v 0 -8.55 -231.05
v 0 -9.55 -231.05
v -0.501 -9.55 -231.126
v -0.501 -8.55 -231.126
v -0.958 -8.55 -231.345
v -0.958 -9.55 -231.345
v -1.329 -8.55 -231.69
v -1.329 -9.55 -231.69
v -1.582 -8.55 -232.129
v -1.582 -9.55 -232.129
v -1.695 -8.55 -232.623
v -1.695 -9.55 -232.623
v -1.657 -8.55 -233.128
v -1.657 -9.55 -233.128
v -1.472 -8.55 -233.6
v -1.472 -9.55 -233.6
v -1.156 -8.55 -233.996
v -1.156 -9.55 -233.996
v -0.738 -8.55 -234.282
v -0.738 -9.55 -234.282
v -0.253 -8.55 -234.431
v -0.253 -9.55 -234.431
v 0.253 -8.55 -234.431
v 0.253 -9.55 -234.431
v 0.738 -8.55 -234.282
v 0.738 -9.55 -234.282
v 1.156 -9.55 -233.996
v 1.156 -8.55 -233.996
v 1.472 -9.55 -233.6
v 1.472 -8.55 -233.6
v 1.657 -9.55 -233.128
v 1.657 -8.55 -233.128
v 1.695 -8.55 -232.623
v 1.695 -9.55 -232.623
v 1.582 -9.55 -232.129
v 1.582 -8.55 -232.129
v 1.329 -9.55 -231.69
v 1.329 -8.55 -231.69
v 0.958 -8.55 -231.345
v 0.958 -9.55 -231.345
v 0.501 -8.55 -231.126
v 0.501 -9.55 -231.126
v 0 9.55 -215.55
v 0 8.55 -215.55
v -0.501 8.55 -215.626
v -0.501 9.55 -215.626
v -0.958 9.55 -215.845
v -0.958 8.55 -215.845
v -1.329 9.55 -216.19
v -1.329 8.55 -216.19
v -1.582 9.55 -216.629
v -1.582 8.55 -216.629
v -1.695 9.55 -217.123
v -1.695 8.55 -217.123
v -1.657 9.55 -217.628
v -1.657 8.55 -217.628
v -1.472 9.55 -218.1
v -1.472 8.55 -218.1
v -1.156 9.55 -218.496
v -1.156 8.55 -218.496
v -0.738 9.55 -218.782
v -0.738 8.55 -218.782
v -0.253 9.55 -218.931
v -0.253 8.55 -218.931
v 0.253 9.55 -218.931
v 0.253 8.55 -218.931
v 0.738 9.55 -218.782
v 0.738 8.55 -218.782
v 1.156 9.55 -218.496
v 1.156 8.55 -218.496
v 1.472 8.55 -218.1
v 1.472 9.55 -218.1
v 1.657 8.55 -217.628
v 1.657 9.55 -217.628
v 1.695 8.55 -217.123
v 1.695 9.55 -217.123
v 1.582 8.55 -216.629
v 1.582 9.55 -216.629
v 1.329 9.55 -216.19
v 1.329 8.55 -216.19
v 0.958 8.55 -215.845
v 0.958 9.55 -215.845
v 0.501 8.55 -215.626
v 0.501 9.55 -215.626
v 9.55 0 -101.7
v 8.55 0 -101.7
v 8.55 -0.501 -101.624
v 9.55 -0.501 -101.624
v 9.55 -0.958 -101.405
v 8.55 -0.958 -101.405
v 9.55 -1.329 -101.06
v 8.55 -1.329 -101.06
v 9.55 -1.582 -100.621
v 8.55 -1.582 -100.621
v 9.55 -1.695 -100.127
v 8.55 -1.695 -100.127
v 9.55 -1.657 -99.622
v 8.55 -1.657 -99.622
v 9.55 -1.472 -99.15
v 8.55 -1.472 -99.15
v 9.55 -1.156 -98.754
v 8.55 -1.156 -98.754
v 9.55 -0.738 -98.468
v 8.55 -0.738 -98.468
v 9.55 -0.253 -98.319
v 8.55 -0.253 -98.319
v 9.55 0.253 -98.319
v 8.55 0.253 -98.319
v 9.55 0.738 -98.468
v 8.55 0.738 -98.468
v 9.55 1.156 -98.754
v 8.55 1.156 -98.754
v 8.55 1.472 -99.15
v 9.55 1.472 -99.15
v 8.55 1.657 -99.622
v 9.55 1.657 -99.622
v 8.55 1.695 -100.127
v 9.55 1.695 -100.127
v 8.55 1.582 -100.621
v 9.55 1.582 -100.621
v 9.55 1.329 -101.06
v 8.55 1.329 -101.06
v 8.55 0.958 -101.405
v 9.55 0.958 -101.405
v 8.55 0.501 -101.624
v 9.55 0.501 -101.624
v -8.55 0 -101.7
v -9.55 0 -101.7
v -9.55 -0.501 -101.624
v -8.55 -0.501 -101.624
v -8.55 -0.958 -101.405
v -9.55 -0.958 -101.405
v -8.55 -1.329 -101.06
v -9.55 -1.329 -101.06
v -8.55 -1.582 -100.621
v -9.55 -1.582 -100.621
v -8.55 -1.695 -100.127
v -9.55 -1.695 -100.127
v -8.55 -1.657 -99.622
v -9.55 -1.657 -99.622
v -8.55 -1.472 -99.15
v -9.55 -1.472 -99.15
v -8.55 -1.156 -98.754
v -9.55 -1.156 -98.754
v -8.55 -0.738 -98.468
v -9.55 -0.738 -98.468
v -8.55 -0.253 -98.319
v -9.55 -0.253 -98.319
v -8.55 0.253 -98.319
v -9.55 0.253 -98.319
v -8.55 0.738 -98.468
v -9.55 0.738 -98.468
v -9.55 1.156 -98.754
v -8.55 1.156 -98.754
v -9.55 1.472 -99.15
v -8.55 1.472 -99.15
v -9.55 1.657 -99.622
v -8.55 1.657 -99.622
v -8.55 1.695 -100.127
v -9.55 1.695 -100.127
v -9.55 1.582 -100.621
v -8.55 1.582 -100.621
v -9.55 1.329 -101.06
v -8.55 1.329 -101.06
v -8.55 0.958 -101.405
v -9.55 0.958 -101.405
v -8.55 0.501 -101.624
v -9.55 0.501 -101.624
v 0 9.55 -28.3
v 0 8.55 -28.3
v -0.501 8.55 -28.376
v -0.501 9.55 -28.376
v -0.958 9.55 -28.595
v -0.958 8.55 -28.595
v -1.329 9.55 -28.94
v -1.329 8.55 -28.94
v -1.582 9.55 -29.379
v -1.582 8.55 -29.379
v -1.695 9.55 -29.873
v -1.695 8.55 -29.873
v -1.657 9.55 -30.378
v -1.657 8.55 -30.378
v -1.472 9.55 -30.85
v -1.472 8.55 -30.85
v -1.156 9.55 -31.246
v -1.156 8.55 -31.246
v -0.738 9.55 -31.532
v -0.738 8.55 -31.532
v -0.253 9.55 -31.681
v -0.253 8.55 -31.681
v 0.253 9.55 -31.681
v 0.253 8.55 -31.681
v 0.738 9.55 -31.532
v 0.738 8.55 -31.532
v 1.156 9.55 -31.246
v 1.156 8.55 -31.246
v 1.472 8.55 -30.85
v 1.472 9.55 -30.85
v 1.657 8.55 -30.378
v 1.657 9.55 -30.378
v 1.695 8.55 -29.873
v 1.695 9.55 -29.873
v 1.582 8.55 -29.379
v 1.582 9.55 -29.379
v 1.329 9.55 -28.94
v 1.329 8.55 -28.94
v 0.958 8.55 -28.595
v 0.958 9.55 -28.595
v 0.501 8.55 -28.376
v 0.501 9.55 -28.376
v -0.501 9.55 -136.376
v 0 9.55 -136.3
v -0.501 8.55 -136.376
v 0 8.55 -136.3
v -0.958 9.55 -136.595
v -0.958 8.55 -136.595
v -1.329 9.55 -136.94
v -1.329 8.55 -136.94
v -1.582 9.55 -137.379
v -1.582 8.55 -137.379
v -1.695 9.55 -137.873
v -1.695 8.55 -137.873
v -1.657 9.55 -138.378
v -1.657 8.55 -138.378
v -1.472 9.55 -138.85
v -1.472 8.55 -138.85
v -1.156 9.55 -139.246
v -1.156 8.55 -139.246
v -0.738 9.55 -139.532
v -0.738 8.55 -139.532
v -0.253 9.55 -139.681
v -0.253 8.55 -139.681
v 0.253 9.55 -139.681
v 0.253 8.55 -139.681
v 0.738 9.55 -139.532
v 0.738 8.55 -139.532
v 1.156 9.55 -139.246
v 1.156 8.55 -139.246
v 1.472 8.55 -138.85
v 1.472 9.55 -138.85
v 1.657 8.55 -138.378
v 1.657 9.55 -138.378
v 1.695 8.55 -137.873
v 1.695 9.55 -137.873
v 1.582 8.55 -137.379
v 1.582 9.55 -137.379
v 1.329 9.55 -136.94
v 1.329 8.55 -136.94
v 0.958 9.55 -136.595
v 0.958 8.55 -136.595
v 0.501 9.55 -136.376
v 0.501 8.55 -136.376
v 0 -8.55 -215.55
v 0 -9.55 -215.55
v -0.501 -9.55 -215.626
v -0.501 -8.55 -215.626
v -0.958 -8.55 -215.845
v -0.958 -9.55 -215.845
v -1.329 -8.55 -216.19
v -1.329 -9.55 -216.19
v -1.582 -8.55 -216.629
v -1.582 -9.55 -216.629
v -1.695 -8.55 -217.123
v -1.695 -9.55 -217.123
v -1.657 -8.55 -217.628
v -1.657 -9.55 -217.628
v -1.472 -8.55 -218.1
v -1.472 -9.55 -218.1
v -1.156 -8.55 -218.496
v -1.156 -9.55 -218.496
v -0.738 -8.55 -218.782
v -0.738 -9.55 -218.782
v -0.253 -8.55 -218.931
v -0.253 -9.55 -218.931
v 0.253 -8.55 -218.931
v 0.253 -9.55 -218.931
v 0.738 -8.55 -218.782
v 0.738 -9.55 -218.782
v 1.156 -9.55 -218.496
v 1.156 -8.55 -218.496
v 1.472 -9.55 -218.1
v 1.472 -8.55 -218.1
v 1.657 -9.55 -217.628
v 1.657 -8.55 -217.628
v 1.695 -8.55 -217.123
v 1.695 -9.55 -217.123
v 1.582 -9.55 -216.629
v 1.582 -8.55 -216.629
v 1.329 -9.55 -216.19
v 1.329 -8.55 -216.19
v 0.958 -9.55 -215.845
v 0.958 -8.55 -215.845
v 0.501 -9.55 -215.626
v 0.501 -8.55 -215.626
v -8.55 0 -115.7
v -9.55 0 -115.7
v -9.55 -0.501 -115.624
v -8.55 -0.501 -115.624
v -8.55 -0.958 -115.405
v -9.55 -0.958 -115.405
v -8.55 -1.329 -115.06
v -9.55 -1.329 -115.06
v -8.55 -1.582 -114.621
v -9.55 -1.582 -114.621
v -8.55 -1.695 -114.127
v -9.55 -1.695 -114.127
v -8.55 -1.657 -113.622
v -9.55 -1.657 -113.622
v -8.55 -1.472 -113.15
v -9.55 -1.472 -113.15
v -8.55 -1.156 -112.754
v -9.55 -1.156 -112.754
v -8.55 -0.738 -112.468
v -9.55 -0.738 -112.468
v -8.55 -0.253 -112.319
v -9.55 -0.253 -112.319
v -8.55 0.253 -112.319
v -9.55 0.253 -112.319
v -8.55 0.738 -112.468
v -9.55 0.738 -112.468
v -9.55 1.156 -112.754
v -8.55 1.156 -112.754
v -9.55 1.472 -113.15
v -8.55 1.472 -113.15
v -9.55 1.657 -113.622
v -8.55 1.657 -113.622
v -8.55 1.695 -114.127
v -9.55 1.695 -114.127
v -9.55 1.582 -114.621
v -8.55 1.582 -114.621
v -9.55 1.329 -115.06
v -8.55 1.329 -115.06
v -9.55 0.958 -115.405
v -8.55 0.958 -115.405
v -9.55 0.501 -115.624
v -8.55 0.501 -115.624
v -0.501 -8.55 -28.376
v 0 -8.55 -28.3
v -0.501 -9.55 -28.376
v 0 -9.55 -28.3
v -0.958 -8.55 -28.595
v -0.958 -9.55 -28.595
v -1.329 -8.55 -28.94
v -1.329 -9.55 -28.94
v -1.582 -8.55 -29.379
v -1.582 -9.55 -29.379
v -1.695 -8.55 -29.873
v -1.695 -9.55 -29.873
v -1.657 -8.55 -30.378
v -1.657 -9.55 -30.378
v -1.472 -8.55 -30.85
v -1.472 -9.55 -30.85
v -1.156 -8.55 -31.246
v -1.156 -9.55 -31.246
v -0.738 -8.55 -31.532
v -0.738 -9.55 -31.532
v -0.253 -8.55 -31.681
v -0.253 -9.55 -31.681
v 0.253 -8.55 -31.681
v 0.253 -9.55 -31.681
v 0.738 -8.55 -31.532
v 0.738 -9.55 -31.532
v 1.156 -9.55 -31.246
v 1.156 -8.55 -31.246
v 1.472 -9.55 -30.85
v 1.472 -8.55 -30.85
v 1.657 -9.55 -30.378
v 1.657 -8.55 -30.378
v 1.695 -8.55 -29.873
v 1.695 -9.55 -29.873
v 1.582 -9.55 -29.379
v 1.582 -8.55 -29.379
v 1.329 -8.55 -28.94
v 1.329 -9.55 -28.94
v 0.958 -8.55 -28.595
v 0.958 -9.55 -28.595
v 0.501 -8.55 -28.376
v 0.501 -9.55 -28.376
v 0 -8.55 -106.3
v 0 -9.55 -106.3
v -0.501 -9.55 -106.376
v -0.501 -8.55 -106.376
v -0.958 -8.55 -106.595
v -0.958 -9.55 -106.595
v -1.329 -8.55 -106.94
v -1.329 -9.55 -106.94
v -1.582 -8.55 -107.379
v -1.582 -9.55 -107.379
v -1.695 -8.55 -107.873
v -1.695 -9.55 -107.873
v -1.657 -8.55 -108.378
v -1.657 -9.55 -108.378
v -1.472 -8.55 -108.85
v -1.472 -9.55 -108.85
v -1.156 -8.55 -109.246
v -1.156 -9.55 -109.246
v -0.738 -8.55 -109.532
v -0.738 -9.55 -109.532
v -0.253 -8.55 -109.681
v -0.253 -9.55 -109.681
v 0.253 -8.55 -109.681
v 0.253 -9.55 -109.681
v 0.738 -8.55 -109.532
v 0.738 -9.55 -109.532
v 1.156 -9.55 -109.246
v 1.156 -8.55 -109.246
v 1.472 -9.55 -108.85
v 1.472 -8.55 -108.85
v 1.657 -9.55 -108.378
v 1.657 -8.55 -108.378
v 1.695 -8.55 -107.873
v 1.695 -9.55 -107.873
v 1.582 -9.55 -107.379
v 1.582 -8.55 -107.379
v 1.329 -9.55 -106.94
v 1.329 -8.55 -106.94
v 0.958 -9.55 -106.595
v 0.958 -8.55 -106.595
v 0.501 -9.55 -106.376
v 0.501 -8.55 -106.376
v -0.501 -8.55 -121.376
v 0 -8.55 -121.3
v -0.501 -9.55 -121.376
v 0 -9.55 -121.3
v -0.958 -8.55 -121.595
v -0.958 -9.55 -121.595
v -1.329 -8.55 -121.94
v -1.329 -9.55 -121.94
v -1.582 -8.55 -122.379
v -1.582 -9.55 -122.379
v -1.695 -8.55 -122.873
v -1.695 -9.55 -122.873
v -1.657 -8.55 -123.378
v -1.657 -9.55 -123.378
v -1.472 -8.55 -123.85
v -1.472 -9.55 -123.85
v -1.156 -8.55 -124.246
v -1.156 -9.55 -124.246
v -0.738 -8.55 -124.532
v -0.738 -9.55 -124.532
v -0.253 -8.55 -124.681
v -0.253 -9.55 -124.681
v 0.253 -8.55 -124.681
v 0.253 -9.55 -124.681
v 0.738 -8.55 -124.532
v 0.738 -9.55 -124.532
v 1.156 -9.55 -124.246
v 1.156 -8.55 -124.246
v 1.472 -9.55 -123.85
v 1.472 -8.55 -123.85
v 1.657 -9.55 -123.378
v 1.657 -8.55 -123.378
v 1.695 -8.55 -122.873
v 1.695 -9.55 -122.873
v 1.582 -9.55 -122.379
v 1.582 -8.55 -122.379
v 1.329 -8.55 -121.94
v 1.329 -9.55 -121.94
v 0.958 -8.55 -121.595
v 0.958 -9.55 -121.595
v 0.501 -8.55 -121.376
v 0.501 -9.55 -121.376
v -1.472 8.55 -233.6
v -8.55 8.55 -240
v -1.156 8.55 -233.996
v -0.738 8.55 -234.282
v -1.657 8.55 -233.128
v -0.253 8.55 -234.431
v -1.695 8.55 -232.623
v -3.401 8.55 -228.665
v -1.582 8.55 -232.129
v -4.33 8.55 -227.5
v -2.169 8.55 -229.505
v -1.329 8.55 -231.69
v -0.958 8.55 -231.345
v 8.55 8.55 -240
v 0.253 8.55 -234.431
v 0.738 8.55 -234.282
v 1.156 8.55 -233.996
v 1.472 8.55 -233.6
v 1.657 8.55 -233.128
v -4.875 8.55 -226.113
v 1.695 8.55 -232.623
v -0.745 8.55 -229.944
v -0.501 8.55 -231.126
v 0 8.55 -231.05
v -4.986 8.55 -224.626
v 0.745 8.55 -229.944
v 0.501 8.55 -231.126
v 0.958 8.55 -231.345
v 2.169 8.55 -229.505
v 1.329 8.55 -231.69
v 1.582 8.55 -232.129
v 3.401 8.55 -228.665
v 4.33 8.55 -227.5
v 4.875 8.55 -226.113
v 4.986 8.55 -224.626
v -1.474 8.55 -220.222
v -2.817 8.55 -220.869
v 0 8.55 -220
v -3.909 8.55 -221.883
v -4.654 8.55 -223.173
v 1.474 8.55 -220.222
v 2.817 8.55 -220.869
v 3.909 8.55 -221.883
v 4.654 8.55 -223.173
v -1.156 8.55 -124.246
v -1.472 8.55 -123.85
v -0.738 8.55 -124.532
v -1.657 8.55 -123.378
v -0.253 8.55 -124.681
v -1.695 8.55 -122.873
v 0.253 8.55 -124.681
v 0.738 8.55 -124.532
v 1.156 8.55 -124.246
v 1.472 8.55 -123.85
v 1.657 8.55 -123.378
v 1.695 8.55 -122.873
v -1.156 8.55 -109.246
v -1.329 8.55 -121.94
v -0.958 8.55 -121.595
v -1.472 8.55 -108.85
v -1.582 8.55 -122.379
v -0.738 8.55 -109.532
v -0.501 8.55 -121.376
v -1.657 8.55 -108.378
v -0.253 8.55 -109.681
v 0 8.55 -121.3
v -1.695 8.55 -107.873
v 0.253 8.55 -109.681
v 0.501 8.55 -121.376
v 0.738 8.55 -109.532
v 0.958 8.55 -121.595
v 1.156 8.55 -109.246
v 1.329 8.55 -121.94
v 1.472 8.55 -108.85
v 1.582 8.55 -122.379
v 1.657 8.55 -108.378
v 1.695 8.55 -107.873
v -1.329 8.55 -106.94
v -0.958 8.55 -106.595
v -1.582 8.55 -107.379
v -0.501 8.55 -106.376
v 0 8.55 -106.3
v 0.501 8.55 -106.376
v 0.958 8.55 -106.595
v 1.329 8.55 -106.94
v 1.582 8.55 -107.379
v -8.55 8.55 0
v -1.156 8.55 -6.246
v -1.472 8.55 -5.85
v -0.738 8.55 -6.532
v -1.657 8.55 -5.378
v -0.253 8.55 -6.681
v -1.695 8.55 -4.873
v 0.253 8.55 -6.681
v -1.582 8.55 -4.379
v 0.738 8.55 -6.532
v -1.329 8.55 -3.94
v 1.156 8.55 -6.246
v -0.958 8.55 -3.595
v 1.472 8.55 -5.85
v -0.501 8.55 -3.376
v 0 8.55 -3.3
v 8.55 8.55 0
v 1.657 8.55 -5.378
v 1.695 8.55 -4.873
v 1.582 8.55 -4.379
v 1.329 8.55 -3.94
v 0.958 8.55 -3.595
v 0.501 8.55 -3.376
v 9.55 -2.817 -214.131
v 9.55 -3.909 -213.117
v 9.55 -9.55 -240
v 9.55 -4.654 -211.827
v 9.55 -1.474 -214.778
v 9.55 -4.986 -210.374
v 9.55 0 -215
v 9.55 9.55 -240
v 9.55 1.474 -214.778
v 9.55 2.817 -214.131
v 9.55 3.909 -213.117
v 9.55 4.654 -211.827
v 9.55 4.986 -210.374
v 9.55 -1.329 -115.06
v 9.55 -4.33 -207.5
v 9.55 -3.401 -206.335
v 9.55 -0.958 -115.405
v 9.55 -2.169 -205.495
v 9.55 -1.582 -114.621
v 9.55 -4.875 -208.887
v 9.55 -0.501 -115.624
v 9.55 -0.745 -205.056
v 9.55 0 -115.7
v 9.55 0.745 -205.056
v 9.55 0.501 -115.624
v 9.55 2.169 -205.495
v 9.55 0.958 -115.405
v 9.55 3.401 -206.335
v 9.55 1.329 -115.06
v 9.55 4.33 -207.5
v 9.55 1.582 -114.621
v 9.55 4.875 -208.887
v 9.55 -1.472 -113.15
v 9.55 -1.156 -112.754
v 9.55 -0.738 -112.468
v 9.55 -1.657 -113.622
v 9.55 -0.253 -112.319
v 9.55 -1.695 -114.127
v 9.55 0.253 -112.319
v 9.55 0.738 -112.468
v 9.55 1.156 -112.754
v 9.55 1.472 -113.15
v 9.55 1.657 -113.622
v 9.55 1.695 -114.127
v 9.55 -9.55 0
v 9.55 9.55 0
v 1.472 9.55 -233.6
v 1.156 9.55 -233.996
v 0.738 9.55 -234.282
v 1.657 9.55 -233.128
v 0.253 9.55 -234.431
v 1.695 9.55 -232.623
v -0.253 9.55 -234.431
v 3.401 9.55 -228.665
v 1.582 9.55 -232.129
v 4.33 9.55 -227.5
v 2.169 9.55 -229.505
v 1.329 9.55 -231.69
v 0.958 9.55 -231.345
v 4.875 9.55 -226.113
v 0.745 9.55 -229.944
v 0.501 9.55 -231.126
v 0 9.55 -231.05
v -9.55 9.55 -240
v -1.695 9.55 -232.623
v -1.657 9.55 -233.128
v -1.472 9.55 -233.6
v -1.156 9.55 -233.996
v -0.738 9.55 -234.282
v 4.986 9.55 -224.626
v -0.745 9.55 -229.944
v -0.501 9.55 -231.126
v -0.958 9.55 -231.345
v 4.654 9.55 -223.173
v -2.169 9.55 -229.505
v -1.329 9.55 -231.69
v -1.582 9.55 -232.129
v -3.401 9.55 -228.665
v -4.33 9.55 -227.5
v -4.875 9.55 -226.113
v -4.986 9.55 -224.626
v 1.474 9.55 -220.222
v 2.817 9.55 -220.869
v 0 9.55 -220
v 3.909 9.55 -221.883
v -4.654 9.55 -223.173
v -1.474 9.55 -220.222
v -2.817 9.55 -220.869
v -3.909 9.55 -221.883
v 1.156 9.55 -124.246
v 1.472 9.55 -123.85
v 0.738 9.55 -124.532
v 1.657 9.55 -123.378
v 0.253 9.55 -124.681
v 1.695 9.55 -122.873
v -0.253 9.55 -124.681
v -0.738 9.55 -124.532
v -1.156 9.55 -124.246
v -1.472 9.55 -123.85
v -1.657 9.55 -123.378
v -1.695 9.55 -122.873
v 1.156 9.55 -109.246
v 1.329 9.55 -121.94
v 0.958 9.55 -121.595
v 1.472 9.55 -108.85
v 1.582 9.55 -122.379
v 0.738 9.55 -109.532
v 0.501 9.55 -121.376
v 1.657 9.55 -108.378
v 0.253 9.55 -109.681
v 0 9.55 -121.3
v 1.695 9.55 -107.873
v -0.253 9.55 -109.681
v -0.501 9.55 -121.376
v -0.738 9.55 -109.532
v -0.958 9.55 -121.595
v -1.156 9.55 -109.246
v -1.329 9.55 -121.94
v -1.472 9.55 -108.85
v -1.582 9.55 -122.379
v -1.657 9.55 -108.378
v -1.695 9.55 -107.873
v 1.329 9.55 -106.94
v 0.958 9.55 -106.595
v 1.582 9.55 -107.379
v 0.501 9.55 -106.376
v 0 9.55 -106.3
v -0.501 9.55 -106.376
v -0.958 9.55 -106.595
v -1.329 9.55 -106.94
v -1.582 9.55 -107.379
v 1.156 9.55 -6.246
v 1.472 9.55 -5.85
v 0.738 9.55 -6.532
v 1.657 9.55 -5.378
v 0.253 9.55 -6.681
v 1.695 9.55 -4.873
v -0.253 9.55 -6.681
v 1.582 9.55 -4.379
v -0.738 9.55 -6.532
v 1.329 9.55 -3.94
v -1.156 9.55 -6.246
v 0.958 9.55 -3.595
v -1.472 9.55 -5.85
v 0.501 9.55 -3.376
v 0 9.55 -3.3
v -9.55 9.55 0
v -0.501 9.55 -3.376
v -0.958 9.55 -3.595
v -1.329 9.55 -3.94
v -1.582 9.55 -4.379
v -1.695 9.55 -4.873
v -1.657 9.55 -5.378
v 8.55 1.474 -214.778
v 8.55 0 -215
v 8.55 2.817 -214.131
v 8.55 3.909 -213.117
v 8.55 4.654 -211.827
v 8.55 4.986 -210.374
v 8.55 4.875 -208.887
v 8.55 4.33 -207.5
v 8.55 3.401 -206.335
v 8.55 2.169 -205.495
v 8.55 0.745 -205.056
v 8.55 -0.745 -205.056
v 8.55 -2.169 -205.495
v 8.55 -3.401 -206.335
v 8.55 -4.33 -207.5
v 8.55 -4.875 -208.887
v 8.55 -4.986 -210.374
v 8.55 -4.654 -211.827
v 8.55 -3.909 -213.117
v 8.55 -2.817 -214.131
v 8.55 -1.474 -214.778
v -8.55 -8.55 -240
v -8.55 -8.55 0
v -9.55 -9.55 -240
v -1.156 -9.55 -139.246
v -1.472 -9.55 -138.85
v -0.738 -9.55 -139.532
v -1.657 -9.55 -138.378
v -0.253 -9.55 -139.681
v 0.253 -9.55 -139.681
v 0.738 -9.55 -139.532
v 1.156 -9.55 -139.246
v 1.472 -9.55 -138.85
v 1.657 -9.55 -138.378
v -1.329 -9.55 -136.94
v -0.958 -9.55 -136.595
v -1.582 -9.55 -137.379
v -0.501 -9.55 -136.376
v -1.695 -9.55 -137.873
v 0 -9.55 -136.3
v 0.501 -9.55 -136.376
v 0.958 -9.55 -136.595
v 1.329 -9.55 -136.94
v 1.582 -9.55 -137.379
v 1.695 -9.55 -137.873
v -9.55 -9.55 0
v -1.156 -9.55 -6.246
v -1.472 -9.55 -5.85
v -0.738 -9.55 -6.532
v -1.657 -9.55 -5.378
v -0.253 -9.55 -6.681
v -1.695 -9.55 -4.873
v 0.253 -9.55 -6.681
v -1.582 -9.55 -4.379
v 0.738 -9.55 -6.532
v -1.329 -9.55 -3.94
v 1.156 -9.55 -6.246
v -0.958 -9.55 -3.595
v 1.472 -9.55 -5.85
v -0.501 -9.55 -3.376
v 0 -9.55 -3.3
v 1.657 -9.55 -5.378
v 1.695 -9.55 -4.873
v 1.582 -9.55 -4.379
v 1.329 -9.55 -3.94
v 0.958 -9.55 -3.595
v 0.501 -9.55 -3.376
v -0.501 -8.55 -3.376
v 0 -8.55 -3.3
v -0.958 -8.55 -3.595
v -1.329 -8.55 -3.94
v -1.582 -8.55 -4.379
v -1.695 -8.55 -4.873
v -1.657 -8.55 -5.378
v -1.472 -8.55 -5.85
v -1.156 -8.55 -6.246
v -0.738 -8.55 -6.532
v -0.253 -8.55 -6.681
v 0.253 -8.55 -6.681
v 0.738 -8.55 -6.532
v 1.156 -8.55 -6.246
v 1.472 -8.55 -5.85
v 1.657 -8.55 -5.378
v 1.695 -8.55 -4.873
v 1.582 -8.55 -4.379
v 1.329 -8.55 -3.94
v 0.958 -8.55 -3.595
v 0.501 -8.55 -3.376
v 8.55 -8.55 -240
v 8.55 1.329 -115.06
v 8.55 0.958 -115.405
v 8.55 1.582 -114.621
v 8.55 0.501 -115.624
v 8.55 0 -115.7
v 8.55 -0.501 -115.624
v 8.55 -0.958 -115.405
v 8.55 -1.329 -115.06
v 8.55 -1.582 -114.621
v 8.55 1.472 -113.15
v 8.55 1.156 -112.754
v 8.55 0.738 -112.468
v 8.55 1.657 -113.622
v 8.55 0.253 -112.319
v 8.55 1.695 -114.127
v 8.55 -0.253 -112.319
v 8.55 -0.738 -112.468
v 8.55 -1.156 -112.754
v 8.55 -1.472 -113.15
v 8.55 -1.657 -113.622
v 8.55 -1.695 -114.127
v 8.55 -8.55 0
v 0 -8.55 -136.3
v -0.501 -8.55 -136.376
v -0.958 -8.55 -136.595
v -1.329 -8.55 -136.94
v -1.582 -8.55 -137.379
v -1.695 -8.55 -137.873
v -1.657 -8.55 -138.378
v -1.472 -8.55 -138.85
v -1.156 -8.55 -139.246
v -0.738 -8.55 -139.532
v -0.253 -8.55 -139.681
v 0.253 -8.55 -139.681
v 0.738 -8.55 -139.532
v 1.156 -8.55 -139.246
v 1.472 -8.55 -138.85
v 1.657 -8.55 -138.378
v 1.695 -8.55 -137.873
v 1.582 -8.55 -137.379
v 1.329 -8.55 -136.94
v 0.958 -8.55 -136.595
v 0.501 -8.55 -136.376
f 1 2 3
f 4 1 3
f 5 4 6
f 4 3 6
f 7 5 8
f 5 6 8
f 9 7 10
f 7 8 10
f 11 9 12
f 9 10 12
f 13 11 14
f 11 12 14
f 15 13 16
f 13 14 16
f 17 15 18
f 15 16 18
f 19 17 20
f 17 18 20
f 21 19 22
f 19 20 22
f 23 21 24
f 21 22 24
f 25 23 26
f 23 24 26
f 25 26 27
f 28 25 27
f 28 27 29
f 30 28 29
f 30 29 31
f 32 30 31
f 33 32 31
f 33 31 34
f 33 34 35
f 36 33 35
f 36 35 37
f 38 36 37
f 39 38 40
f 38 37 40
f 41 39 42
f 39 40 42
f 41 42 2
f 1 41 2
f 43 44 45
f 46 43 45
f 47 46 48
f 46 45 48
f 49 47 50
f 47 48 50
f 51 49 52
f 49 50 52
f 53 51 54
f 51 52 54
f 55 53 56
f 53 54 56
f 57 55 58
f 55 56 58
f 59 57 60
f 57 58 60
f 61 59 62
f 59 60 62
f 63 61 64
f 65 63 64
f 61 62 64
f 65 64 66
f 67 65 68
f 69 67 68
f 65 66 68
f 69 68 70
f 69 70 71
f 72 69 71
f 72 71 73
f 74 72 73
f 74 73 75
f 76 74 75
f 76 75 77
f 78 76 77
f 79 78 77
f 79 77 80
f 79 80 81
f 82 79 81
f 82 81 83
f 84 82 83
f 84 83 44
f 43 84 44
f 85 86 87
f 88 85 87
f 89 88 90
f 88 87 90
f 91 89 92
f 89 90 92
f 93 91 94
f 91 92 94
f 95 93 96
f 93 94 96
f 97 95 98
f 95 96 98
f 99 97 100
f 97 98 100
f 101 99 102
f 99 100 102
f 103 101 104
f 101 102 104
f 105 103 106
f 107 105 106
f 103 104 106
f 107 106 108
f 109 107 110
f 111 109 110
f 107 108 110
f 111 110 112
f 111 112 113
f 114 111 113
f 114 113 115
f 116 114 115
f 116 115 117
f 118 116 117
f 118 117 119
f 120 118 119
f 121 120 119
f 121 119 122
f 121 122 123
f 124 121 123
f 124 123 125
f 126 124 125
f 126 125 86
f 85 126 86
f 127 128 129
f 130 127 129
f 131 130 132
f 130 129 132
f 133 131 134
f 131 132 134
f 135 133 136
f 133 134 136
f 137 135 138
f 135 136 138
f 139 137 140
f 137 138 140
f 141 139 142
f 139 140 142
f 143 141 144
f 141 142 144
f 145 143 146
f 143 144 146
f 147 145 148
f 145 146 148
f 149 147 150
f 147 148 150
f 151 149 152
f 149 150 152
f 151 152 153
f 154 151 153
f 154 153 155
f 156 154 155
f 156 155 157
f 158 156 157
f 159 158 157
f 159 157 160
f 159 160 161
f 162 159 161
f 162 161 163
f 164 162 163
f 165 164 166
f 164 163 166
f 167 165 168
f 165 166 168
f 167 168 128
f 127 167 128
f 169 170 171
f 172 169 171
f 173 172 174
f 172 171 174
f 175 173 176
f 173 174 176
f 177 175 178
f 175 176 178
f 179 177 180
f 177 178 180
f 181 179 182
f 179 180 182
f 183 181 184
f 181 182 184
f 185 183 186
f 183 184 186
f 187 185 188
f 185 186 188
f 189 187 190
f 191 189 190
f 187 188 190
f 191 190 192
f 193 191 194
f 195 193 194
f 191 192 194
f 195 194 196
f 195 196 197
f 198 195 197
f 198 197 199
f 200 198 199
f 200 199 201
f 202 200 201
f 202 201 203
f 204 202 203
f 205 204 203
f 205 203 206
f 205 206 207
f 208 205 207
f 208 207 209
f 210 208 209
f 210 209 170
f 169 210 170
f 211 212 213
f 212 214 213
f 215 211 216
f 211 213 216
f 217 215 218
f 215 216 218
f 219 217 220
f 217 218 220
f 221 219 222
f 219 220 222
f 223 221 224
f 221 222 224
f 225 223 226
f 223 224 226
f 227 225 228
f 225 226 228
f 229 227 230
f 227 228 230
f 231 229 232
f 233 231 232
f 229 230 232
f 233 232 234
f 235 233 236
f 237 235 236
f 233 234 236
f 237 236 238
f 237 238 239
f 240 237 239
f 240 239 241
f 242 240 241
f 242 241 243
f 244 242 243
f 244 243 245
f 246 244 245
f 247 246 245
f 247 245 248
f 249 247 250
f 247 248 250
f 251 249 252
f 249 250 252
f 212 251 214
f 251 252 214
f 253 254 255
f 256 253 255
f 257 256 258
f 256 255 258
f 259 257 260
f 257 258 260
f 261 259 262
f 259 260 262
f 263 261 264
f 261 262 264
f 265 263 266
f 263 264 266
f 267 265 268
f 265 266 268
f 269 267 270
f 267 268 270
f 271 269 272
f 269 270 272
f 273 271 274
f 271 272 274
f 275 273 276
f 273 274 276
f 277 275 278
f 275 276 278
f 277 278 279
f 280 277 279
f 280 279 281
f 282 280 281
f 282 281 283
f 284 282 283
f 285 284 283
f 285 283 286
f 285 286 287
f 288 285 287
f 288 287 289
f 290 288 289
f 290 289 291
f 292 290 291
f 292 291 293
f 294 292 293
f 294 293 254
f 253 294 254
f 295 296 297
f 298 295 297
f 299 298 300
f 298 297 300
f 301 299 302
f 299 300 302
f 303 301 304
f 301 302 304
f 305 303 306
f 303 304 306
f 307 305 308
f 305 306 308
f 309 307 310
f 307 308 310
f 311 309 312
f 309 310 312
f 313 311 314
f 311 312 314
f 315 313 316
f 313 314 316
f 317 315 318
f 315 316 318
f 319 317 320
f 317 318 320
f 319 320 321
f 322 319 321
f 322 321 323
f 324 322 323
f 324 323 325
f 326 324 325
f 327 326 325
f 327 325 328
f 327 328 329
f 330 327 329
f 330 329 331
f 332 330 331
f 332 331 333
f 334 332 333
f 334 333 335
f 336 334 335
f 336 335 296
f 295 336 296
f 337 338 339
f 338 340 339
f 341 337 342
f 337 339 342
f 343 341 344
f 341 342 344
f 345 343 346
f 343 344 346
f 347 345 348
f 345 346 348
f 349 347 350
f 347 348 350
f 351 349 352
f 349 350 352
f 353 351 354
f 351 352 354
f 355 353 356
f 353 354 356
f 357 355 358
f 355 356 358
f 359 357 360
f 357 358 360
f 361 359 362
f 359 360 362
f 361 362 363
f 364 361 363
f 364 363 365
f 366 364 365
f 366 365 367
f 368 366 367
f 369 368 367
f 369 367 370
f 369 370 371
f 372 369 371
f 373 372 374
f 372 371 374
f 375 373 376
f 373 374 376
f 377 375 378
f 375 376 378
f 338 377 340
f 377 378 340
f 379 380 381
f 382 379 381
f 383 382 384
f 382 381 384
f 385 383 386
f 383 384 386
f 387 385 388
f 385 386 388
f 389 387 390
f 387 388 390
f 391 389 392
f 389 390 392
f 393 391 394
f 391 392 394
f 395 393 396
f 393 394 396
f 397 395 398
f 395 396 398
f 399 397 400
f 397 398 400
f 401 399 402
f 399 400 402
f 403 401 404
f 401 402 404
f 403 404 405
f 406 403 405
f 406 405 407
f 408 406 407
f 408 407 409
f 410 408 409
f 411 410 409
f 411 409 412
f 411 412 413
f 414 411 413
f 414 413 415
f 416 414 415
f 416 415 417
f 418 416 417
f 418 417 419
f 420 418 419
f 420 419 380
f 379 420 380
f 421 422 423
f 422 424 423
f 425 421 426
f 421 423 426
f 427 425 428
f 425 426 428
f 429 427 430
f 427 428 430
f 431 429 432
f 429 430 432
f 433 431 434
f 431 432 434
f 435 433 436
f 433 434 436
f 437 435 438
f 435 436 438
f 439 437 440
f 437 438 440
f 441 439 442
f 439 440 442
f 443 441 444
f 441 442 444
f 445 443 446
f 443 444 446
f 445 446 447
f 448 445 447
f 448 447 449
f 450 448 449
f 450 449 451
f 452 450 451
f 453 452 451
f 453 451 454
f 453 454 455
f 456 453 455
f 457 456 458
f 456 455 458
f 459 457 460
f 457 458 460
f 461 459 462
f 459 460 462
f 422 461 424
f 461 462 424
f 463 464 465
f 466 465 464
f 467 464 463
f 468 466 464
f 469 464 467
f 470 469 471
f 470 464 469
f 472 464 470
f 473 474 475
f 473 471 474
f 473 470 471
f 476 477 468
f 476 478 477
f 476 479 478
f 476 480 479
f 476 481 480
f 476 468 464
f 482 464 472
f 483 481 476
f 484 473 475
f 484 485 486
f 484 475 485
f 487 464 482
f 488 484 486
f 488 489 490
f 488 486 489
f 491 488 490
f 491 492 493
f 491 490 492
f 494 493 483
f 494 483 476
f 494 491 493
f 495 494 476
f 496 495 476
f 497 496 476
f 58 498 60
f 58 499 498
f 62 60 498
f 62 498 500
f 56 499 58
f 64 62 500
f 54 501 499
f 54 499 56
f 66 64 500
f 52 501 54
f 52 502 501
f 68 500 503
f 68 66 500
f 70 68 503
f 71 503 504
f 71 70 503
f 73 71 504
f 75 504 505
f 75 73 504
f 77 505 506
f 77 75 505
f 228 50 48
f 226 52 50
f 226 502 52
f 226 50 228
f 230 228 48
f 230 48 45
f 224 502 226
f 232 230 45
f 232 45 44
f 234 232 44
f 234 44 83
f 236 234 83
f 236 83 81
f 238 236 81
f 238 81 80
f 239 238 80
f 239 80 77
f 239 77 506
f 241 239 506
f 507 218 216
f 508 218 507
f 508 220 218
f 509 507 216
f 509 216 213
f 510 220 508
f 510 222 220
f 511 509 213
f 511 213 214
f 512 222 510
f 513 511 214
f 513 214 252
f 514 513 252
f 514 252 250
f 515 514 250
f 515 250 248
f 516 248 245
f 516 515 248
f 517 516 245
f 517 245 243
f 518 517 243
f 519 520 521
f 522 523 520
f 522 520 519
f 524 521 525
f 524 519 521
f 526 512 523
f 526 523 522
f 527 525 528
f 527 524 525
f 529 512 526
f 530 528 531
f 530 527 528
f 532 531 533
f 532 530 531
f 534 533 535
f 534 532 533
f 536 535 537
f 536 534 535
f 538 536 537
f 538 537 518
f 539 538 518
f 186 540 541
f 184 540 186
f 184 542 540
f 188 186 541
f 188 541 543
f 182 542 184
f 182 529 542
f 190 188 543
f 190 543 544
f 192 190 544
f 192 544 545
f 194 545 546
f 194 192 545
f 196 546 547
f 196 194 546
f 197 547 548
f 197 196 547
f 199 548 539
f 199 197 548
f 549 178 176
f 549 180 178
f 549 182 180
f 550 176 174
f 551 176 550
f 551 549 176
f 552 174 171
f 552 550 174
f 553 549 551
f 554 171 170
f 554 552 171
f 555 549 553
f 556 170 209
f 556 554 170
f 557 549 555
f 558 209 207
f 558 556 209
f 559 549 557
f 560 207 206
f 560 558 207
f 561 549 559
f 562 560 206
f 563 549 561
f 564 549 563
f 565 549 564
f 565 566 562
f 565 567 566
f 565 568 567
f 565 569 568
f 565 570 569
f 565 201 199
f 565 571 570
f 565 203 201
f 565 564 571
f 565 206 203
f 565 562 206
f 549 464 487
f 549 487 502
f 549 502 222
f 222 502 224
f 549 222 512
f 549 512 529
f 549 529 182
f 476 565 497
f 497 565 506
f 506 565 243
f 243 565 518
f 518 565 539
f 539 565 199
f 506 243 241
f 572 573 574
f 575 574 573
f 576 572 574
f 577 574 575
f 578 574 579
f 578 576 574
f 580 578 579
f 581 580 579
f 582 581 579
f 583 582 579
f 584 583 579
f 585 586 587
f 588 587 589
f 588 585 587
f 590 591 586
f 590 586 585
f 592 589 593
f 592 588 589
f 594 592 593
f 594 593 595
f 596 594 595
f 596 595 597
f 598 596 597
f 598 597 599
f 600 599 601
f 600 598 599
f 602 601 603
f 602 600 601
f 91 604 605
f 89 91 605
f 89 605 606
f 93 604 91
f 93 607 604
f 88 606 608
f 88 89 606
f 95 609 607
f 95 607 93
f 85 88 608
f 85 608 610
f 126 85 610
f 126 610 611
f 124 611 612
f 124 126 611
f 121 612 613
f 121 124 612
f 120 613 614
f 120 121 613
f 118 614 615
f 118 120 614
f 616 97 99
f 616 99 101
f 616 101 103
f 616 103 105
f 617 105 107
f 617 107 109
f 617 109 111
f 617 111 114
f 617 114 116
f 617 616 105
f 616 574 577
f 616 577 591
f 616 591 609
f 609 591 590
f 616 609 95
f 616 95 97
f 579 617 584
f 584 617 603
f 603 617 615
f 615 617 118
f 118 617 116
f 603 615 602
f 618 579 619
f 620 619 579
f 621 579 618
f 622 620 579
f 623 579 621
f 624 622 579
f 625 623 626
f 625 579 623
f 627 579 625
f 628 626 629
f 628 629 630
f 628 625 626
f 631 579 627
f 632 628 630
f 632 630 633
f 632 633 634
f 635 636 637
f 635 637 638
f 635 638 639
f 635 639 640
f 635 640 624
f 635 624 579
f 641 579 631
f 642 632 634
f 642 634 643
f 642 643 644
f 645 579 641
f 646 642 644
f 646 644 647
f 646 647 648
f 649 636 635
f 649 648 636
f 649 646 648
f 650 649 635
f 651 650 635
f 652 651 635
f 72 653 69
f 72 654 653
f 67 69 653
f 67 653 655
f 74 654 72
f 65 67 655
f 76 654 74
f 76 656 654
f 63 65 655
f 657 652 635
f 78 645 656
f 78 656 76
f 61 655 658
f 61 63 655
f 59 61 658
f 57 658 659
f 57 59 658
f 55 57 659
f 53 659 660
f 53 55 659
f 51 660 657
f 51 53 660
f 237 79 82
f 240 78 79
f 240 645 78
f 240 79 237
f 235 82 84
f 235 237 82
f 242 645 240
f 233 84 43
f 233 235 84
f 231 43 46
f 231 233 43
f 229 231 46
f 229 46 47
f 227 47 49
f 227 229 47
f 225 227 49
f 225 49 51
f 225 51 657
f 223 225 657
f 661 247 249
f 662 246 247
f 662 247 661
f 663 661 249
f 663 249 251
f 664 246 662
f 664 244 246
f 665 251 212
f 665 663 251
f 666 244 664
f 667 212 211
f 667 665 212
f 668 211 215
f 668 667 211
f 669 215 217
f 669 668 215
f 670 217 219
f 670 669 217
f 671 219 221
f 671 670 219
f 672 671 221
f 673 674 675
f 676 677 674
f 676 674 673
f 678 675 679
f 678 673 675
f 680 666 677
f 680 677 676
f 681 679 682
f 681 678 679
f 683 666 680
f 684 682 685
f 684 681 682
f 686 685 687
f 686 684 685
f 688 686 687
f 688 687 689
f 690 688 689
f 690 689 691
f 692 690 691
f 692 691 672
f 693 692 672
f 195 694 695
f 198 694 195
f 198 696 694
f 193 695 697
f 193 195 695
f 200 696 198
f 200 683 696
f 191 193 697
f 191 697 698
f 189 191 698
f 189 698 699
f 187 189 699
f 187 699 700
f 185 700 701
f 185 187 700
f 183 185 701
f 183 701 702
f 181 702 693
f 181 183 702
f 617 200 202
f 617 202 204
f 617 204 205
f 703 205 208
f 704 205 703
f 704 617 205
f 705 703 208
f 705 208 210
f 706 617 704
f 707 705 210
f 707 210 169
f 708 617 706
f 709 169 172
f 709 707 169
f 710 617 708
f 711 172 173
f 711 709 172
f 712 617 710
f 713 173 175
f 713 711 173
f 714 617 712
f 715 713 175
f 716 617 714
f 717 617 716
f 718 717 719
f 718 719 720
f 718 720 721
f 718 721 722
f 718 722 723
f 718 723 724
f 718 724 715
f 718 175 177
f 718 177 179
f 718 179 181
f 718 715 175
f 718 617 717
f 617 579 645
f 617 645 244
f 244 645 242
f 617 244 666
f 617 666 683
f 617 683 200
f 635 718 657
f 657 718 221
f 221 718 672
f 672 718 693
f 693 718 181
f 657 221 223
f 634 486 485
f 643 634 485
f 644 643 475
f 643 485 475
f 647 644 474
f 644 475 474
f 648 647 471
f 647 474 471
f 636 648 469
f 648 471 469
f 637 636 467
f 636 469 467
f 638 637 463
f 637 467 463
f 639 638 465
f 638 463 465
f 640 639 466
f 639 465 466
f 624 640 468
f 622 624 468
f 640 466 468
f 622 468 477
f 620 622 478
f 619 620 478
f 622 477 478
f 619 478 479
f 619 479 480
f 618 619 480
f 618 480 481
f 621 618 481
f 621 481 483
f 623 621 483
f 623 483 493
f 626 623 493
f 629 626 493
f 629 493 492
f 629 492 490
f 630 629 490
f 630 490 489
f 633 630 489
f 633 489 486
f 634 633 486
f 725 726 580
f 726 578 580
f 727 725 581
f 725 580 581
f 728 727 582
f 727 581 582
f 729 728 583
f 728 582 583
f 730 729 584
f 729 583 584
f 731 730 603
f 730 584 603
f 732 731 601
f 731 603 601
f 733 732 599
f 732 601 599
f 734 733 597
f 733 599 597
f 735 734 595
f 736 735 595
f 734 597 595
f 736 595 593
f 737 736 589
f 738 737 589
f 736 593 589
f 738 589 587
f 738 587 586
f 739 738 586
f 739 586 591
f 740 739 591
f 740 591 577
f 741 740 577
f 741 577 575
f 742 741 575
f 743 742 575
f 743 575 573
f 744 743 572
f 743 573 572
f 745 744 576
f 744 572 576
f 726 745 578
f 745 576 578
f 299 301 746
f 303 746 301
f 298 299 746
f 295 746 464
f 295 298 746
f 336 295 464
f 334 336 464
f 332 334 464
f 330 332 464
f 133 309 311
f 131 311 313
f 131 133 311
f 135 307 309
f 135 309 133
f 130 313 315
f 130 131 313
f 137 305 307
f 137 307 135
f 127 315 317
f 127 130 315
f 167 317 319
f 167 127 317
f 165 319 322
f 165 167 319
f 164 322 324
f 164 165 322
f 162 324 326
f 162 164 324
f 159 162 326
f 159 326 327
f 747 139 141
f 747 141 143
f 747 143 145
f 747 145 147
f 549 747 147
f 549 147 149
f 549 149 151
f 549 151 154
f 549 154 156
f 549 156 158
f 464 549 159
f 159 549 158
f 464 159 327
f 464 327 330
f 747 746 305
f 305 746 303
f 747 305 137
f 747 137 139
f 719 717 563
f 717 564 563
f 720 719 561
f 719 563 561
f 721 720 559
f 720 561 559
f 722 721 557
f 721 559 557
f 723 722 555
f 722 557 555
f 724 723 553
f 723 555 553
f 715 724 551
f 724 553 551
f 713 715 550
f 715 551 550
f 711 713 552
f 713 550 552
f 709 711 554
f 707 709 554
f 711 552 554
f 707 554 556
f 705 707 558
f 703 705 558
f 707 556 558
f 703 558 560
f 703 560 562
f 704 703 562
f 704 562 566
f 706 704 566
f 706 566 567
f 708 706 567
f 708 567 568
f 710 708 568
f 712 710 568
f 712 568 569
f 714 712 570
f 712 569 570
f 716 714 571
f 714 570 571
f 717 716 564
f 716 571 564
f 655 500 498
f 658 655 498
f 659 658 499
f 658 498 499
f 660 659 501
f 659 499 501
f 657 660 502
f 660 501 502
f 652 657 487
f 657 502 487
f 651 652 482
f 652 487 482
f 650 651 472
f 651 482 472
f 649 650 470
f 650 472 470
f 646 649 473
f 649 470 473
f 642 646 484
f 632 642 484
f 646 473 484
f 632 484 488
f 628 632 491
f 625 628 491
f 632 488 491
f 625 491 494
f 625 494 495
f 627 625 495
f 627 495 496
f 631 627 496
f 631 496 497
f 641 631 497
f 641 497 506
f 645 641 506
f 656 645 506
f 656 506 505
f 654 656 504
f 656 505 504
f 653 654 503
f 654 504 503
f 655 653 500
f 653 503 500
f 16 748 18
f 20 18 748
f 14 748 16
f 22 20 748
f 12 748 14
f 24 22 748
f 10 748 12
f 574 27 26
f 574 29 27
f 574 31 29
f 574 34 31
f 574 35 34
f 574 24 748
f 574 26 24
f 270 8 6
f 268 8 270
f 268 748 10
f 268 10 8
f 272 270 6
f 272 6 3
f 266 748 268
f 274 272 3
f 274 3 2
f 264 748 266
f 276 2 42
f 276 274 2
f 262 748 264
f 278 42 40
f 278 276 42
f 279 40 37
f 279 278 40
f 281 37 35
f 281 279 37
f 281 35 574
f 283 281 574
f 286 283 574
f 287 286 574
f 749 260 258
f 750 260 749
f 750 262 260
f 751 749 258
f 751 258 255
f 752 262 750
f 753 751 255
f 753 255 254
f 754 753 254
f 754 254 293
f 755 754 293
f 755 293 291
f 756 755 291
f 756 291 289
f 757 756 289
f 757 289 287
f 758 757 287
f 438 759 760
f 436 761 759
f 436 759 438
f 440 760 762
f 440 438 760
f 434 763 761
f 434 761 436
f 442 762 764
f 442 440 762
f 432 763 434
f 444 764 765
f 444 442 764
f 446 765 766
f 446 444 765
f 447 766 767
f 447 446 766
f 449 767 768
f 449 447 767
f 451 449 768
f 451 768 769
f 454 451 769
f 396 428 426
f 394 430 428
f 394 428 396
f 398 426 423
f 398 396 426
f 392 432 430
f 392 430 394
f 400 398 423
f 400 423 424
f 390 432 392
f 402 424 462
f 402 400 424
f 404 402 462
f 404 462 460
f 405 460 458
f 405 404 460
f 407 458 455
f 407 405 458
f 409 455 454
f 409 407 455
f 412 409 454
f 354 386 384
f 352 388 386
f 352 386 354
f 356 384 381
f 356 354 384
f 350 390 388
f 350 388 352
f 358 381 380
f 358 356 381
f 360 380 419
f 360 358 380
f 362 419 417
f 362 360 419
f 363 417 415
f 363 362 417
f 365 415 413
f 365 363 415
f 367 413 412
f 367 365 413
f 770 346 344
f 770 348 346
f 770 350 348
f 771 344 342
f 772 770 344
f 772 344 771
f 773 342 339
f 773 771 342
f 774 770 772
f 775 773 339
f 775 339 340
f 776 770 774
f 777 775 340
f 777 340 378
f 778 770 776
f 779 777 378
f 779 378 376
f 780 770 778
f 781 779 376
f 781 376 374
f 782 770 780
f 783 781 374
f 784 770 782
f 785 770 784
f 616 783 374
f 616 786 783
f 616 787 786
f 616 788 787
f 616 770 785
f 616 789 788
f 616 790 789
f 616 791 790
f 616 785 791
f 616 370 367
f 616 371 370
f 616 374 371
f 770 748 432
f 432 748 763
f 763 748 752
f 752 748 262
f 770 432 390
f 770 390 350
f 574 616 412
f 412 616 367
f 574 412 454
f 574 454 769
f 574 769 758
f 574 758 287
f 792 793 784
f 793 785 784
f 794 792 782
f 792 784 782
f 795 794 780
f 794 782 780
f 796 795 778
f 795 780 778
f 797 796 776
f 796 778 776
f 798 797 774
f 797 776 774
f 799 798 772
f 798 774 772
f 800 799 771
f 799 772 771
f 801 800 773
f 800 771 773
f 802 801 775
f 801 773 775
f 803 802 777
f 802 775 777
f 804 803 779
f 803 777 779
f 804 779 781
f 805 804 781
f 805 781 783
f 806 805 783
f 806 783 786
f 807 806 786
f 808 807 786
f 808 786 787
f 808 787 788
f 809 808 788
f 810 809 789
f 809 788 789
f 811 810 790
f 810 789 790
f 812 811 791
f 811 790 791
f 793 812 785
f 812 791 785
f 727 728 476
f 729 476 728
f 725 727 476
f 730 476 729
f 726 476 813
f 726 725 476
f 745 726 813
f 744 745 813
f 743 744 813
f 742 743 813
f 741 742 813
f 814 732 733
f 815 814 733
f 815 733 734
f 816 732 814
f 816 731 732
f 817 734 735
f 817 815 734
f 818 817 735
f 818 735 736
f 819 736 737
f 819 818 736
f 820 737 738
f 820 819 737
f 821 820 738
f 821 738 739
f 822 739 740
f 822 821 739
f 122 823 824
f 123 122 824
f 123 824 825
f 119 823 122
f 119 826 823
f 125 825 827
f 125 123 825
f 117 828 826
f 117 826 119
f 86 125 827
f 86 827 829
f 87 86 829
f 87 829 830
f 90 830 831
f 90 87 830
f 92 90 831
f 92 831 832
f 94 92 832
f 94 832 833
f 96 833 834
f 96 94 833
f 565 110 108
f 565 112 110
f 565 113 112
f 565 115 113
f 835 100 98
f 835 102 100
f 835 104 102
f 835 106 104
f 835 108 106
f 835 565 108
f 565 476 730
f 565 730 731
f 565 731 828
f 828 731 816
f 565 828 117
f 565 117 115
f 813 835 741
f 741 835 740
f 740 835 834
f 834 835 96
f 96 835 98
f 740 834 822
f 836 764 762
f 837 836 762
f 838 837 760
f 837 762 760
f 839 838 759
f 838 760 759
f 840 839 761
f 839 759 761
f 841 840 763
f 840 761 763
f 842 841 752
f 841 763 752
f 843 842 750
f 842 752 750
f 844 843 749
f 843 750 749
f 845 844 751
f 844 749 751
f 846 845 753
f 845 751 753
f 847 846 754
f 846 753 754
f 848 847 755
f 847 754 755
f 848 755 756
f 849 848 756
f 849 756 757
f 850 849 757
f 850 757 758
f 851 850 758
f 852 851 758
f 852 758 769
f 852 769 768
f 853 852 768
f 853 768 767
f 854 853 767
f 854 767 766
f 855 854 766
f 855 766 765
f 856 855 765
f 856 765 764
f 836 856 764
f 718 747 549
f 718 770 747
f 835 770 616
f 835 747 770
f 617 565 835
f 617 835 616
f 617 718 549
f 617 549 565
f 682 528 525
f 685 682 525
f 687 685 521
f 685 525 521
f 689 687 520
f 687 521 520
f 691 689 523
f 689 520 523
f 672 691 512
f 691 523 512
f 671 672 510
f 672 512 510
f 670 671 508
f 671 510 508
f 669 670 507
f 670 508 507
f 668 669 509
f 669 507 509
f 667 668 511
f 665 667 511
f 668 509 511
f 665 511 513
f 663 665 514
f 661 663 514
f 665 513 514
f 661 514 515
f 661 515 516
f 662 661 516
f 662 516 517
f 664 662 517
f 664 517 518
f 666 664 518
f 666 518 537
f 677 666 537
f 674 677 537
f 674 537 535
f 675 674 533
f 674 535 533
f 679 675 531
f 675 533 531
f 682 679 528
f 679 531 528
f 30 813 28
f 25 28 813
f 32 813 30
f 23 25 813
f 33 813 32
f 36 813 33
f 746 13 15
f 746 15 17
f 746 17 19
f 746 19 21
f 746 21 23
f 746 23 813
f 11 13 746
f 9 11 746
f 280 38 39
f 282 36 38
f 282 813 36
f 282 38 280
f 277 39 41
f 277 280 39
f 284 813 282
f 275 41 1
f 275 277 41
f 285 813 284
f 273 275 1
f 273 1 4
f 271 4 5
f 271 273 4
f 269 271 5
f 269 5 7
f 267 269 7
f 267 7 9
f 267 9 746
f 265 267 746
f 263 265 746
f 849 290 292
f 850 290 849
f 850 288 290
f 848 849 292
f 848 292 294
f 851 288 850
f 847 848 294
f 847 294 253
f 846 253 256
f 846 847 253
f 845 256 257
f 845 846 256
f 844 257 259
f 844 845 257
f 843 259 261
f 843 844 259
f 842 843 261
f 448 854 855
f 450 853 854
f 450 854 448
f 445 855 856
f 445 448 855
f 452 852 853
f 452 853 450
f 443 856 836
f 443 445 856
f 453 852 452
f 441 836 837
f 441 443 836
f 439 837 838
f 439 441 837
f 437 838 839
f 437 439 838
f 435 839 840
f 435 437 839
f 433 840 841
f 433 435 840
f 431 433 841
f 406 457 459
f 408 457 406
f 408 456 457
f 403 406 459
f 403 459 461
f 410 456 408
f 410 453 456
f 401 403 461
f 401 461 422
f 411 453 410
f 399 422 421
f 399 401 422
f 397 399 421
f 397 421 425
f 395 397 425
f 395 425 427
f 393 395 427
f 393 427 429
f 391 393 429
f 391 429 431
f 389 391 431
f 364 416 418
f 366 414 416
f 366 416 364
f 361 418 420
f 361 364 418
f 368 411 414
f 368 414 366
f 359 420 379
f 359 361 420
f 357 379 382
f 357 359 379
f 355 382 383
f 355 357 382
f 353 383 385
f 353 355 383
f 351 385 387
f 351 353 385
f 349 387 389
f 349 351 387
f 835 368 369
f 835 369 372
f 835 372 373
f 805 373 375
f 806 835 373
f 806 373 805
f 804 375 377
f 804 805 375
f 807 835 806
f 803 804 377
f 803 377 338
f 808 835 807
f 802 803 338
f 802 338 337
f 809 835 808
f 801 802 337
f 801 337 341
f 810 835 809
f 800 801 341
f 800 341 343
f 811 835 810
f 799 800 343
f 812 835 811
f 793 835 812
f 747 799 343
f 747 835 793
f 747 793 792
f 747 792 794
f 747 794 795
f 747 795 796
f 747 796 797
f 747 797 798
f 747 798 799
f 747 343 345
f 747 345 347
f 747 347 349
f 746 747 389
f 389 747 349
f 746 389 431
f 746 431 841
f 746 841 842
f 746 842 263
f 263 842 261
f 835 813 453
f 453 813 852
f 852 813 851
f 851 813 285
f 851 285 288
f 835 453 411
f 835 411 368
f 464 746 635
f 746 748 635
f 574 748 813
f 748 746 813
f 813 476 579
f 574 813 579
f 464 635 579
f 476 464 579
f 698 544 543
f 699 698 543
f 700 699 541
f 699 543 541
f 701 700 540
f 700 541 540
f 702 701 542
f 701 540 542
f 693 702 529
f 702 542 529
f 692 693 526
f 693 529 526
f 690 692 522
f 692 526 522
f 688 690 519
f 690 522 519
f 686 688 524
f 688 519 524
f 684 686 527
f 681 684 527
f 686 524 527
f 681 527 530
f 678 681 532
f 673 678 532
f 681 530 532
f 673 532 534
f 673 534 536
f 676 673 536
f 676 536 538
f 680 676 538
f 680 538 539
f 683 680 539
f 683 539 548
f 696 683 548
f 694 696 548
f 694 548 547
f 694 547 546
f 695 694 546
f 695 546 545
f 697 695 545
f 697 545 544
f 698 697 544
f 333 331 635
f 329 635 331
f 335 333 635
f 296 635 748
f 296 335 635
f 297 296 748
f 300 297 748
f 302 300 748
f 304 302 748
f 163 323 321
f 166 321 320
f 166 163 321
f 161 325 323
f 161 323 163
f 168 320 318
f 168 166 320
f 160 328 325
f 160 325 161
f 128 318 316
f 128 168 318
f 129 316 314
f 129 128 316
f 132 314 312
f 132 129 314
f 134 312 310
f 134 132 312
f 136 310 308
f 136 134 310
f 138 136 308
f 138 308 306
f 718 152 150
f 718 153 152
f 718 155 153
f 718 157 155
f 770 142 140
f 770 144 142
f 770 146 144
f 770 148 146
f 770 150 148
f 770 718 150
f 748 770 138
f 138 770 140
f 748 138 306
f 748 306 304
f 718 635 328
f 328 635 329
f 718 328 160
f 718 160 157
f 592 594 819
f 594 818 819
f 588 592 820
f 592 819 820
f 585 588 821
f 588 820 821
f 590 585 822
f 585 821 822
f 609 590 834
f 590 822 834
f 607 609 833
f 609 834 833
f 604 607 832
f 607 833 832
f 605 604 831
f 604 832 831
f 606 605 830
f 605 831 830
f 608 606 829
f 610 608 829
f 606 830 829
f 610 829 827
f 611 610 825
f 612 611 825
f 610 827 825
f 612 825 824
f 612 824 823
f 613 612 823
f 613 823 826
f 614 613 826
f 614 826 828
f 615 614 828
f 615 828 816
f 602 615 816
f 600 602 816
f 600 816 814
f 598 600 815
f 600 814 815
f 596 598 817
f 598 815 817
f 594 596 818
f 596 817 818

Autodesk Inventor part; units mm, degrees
ref_plane "YZ Plane" through (0, 0, 0) normal (1, 0, 0) x (0, 1, 0)
ref_plane "XZ Plane" through (0, 0, 0) normal (0, 1, 0) x (-1, 0, 0)
ref_plane "XY Plane" through (0, 0, 0) normal (0, 0, 1) x (1, 0, 0)
sketch "Boceto1" plane through (0, 0, 0) normal (0, 0, 1) x (1, 0, 0)
  line L0 (-9.55, -9.55) -> (9.55, -9.55)
  line L1 (9.55, -9.55) -> (9.55, 9.55)
  line L2 (9.55, 9.55) -> (-9.55, 9.55)
  line L3 (-9.55, 9.55) -> (-9.55, -9.55)
  line L4 (-9.55, -9.55) -> (9.55, 9.55) construction
  line L5 (9.55, -9.55) -> (-9.55, 9.55) construction
  line L6 (-8.55, 8.55) -> (8.55, 8.55)
  line L7 (8.55, 8.55) -> (8.55, -8.55)
  line L8 (8.55, -8.55) -> (-8.55, -8.55)
  line L9 (-8.55, -8.55) -> (-8.55, 8.55)
  point P0 (0, 0)
  dimension "d0" = 19.1
  dimension "d1" = 19.1
  dimension "d2" = 1
extrude "Extrusión1" add sketch "Boceto1" against normal blind 240
sketch "Boceto2" plane through (-9.55, 9.55, 0) normal (0, 1, 0) x (1, 0, 0)
  line L0 (19.1, 0) -> (0, 0) projected
  line L1 (9.55, 0) -> (9.55, 240) construction
  line L2 (19.1, 240) -> (0, 240) construction
  point P0 (9.55, 5)
  point P1 (9.55, 30)
  point P2 (9.55, 108)
  point P3 (9.55, 123)
  point P4 (9.55, 138)
  point P5 (9.55, 225)
  point P6 (9.55, 232.75)
  point P7 (9.55, 217.25)
  dimension "d5" = 5
  dimension "d6" = 30
  dimension "d7" = 78
  dimension "d10" = 15
  dimension "d15" = 15
  dimension "d19" = 15.5
  dimension "d24" = 7.75
hole "Agujero1" at (0, 9.55, -5) at (0, 9.55, -30) at (0, 9.55, -108) at (0, 9.55, -123) at (0, 9.55, -138) at (0, 9.55, -217.25) at (0, 9.55, -232.75) direction (0, -1, 0) diameter 3.4 end through all clearance for "Tornillo para maquinaria de cabeza plana" size "M3" standard "Perfil M métrico ANSI"
hole "Agujero2" at (0, 9.55, -225) direction (0, -1, 0) diameter 10 depth 1
sketch "Boceto3" plane through (9.55, -9.55, 0) normal (1, 0, 0) x (0, 0, -1)
  line L0 (240, 19.1) -> (240, 0) construction
  line L1 (240, 9.55) -> (210, 9.55) construction
  circle A0 centre (210, 9.55) radius 5
  point P0 (0, 9.55)
  dimension "d39" = 30
  dimension "d40" = 10
extrude "Extrusión2" cut sketch "Boceto3" against normal up to next
sketch "Boceto4" plane through (9.55, -9.55, 0) normal (1, 0, 0) x (0, 0, -1)
  line L0 (0, 9.55) -> (191.9692, 9.55) construction
  line L1 (0, 0) -> (0, 19.1) construction
  point P0 (100, 9.55)
  point P1 (114, 9.55)
  dimension "d43" = 100
  dimension "d44" = 14
hole "Agujero3" at (9.55, 0, -100) at (9.55, 0, -114) direction (-1, 0, 0) diameter 3.4 end through all clearance for "Tornillo para maquinaria de cabeza plana" size "M3" standard "Perfil M métrico ANSI"
properties part number "perfil" material "Aluminio 6061"
